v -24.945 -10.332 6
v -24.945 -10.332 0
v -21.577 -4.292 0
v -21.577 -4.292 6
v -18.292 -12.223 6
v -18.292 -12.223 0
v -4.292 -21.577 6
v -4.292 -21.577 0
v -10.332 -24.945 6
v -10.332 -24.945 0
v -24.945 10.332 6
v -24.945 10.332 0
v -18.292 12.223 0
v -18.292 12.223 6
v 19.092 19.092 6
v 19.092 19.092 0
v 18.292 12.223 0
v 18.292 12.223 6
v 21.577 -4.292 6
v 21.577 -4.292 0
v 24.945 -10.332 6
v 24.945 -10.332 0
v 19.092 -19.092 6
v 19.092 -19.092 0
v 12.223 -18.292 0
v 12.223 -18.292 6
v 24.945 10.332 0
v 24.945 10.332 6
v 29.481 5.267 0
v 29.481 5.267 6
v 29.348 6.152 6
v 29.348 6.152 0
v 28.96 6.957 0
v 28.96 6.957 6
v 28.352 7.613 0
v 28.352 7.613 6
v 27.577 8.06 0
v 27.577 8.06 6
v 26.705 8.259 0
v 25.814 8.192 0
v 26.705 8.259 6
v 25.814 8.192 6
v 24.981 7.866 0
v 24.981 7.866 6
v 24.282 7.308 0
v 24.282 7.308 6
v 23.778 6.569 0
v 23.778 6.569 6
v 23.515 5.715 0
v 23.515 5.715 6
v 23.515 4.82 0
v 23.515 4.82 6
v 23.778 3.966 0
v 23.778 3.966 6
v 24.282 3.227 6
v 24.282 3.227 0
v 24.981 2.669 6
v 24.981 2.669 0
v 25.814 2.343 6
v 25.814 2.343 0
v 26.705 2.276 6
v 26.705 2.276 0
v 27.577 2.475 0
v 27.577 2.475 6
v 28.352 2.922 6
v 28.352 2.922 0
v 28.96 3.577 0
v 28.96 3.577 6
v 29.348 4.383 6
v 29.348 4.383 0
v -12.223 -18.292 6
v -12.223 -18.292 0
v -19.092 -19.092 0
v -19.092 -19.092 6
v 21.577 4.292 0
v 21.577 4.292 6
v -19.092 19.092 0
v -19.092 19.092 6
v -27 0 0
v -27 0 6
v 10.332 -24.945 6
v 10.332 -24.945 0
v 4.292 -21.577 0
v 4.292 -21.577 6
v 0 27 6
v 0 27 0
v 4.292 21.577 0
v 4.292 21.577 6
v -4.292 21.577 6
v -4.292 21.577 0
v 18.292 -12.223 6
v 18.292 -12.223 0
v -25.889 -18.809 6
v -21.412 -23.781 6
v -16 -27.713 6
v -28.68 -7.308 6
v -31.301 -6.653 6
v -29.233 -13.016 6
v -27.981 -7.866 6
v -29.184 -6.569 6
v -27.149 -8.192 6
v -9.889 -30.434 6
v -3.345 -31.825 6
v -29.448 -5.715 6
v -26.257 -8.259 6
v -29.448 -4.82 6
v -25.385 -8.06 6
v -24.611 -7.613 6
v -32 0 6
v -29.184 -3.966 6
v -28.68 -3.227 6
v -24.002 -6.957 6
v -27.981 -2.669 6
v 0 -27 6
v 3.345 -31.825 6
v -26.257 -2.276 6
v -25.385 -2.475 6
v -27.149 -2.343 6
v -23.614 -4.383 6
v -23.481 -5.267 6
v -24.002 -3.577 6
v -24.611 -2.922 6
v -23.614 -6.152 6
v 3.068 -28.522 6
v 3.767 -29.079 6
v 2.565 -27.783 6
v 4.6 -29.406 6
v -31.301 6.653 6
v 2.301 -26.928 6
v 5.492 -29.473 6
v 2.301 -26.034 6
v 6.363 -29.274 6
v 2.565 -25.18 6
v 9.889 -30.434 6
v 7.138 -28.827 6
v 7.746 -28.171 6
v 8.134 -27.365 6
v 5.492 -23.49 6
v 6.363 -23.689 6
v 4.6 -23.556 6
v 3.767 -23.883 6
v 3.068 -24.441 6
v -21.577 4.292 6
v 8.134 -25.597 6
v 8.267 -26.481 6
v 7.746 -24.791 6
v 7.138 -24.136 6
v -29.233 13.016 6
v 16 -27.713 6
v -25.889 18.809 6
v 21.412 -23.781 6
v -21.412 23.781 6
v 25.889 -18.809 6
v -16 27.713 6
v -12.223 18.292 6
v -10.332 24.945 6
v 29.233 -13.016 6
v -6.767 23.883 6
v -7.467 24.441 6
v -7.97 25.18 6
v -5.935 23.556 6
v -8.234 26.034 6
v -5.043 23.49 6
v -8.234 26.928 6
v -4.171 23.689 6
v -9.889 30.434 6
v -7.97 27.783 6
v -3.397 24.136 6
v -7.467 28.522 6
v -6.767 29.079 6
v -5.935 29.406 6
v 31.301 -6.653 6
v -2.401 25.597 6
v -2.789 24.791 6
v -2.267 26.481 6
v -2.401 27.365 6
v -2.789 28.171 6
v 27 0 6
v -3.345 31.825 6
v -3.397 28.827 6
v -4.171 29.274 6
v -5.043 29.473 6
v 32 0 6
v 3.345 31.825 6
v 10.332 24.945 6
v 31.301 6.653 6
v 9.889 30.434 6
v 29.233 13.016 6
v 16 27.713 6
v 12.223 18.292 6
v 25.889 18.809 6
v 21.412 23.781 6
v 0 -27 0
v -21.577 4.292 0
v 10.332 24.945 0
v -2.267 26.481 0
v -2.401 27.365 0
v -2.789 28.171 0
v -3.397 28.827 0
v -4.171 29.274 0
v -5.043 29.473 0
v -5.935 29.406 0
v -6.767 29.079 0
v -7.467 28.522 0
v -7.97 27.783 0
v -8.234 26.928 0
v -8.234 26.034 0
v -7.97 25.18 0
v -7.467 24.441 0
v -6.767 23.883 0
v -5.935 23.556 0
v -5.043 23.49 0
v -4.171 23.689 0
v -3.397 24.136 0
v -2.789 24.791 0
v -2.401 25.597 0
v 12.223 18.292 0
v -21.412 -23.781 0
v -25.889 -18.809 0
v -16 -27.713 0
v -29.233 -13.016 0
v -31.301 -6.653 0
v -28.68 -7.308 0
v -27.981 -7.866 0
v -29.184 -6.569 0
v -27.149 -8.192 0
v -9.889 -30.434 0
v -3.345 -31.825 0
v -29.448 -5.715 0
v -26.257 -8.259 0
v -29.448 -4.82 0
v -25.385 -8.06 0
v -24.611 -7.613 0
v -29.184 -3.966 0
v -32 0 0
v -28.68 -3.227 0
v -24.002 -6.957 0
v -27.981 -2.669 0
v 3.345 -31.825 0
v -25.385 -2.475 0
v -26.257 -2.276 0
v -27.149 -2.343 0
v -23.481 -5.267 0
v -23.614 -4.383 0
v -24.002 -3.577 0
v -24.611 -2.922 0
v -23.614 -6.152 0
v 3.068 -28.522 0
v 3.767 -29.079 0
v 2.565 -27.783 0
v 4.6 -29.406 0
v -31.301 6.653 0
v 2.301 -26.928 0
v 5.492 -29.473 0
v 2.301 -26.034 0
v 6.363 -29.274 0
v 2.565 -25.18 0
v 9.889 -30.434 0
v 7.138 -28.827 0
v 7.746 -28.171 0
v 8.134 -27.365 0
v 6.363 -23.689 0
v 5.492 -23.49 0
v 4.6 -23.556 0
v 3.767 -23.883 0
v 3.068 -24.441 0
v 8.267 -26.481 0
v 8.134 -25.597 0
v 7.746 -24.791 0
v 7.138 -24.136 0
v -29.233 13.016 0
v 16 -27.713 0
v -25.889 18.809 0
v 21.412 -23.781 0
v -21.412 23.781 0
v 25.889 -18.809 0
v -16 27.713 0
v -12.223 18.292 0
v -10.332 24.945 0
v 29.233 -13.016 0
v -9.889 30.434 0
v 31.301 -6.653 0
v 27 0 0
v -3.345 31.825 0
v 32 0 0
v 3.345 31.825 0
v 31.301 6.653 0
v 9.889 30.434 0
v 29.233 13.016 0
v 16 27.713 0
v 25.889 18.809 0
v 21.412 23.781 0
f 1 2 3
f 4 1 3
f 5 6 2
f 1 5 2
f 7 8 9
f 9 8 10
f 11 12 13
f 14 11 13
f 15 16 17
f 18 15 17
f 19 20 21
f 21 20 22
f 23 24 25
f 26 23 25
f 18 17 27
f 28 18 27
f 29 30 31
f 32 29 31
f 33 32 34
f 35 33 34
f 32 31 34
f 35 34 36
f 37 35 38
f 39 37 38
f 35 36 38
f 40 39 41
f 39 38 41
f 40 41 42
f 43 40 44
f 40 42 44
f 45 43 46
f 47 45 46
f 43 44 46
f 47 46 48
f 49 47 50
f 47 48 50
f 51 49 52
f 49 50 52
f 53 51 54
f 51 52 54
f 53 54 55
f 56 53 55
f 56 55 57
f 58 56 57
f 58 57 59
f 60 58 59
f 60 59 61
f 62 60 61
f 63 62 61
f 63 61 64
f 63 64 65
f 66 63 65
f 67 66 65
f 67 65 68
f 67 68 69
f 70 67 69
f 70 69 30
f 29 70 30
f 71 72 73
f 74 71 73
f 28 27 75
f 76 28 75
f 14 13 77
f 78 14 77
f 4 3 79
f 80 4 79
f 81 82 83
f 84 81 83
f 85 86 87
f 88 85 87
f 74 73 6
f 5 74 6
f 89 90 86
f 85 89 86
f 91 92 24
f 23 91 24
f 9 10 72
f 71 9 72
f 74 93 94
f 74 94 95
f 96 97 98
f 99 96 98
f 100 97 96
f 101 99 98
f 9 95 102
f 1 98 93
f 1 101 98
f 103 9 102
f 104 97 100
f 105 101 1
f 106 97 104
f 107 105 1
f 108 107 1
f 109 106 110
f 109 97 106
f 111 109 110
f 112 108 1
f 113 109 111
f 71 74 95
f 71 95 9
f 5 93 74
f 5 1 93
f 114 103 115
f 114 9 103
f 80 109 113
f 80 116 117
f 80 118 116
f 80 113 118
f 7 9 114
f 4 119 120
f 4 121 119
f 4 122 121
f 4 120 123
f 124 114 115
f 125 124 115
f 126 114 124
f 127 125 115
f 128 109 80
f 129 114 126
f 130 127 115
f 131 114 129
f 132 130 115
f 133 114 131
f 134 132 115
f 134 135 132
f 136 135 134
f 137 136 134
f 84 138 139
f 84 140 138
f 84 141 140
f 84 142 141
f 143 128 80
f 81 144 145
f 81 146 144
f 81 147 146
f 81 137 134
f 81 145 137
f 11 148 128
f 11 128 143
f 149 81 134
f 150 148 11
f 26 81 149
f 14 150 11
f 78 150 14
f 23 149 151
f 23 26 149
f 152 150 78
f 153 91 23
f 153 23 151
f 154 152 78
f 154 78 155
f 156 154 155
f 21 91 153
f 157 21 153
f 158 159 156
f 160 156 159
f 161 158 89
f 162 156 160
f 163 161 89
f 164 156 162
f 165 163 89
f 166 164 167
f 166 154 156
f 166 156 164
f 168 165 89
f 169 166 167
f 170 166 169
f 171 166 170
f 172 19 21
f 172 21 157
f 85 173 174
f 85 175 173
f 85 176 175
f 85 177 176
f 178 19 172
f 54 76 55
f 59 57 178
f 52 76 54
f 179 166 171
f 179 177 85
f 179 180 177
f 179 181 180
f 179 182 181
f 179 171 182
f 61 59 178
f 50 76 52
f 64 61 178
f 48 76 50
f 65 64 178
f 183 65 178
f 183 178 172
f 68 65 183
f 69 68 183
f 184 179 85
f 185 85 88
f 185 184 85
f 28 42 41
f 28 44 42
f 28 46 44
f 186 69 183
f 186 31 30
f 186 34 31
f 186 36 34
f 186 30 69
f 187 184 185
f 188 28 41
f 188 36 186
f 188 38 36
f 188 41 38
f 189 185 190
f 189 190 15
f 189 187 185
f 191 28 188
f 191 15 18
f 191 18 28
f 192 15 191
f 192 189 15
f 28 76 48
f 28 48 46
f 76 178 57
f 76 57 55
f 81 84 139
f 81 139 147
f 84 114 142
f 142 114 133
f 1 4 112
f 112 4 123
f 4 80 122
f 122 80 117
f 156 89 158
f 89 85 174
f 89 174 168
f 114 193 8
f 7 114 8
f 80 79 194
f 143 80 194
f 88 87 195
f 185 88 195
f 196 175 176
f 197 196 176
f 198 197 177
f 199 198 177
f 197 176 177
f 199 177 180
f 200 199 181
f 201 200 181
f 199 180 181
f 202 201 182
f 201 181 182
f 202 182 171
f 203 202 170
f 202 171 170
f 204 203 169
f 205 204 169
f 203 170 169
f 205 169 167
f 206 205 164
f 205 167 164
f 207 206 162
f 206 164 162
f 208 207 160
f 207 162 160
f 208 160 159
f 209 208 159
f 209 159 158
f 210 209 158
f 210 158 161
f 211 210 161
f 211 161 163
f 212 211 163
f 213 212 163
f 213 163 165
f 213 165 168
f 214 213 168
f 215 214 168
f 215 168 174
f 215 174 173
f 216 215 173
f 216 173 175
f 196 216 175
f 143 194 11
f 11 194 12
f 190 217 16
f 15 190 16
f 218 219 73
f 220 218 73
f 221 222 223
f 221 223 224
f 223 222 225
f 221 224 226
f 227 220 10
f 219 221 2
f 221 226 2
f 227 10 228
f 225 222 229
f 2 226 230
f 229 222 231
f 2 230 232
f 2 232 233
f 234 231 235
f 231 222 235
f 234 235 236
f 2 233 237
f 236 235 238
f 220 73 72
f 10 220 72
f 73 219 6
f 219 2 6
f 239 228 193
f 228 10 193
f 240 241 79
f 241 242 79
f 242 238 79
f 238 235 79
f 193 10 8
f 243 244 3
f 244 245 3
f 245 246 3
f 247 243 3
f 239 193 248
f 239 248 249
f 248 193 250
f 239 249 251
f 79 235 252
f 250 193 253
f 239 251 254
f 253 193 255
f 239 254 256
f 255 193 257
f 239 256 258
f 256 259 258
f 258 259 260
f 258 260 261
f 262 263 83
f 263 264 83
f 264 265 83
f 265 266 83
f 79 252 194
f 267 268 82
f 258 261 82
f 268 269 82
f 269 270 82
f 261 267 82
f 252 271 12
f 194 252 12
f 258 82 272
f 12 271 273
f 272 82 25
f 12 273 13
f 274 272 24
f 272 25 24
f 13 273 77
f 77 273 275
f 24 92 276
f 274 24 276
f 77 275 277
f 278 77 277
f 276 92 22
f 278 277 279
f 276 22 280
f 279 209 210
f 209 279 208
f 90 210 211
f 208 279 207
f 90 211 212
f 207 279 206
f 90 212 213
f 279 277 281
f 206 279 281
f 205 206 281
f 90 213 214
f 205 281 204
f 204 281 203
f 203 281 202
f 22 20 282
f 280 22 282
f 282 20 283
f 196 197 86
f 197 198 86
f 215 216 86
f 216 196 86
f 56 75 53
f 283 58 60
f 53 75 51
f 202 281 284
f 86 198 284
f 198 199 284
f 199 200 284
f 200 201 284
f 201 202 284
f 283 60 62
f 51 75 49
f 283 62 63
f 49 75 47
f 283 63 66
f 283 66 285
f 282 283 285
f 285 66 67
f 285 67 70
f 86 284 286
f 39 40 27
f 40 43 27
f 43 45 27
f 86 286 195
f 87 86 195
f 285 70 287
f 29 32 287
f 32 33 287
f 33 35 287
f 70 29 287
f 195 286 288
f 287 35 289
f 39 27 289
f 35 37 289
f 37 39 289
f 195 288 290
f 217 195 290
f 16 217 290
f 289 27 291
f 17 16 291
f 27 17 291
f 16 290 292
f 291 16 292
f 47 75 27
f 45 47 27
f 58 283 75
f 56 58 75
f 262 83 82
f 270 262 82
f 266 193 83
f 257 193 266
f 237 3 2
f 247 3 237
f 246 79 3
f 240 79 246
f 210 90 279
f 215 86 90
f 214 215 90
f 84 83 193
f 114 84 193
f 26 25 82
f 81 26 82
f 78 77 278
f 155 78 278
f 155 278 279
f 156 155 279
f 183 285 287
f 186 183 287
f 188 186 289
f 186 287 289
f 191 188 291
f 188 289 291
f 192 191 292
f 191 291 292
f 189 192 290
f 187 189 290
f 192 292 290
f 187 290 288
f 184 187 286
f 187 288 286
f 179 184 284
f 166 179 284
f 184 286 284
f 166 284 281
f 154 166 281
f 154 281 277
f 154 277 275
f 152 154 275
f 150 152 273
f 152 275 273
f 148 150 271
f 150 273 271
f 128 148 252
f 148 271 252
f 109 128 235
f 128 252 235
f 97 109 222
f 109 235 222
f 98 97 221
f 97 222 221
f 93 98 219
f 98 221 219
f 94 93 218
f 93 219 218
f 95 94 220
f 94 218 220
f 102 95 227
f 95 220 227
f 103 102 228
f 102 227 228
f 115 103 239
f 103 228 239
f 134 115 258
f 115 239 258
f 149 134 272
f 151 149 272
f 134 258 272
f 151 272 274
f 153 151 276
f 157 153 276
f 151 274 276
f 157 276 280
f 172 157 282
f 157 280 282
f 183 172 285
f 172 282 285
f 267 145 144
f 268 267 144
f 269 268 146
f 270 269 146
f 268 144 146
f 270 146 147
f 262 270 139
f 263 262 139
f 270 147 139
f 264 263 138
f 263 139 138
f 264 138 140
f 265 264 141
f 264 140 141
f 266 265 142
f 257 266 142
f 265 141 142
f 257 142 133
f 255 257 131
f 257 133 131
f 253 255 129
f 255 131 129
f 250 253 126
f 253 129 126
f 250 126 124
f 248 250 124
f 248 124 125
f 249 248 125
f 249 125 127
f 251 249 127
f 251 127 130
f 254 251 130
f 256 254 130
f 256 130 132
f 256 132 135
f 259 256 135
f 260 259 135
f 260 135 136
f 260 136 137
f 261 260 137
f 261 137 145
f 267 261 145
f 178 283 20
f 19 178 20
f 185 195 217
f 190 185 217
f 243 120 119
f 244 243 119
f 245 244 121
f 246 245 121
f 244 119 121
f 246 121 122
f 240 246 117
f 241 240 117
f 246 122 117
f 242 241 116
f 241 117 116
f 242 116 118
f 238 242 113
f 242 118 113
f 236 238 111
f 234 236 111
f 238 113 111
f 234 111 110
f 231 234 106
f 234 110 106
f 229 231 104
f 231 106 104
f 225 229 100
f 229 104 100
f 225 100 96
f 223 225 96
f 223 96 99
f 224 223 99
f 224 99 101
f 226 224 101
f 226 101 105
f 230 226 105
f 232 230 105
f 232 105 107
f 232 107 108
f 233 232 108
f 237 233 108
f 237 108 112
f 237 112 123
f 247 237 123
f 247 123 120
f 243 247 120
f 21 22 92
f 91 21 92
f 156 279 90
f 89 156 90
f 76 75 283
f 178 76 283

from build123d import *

# Parameters (mm, degrees)
ESBO_O1_R                = 32
ESBO_O1_R_2              = 27
RESSALTO_EXTRUS_O2_DEPTH = 6
ESBO_O3_R                = 3
CORTE_EXTRUS_O1_DEPTH    = 46.650848842
ESBO_O4_R                = 3
ESBO_O4_R_2              = 3.281084103
RESSALTO_EXTRUS_O3_DEPTH = 6


with BuildPart() as part:
    # Esboço1 → Ressalto-extrusão2 (new body)
    # profile 1 of 17: a face of its own
    with BuildSketch(Plane.XY):
        Circle(ESBO_O1_R)
        Circle(ESBO_O1_R_2, mode=Mode.SUBTRACT)
    # profile 2 of 17: a face of its own
    with BuildSketch(Plane.XY):
        with BuildLine():
            Line((-4.291987084, 21.577276169), (0, 27))
            ThreePointArc((0, 27), (-5.267438694, 26.481202571), (-10.332452674, 24.944747378))
            Line((-10.332452674, 24.944747378), (-4.291987084, 21.577276169))
        make_face()
    # profile 3 of 17: a face of its own
    with BuildSketch(Plane.XY):
        with BuildLine():
            Line((-12.222545126, 18.292331471), (-10.332452674, 24.944747378))
            ThreePointArc((-10.332452674, 24.944747378), (-15.000396292, 22.449679532), (-19.091883092, 19.091883092))
            Line((-19.091883092, 19.091883092), (-12.222545126, 18.292331471))
        make_face()
    # profile 4 of 17: a face of its own
    with BuildSketch(Plane.XY):
        with BuildLine():
            Line((-18.292331471, 12.222545126), (-19.091883092, 19.091883092))
            ThreePointArc((-19.091883092, 19.091883092), (-22.449679532, 15.000396292), (-24.944747378, 10.332452674))
            Line((-24.944747378, 10.332452674), (-18.292331471, 12.222545126))
        make_face()
    # profile 5 of 17: a face of its own
    with BuildSketch(Plane.XY):
        with BuildLine():
            Line((-21.577276169, 4.291987084), (-24.944747378, 10.332452674))
            ThreePointArc((-24.944747378, 10.332452674), (-26.481202571, 5.267438694), (-27, 0))
            Line((-27, 0), (-21.577276169, 4.291987084))
        make_face()
    # profile 6 of 17: a face of its own
    with BuildSketch(Plane.XY):
        with BuildLine():
            Line((-21.577276169, -4.291987084), (-27, 0))
            ThreePointArc((-27, 0), (-26.481202571, -5.267438694), (-24.944747378, -10.332452674))
            Line((-24.944747378, -10.332452674), (-21.577276169, -4.291987084))
        make_face()
    # profile 7 of 17: a face of its own
    with BuildSketch(Plane.XY):
        with BuildLine():
            Line((-18.292331471, -12.222545126), (-24.944747378, -10.332452674))
            ThreePointArc((-24.944747378, -10.332452674), (-22.449679532, -15.000396292), (-19.091883092, -19.091883092))
            Line((-19.091883092, -19.091883092), (-18.292331471, -12.222545126))
        make_face()
    # profile 8 of 17: a face of its own
    with BuildSketch(Plane.XY):
        with BuildLine():
            Line((-12.222545126, -18.292331471), (-19.091883092, -19.091883092))
            ThreePointArc((-19.091883092, -19.091883092), (-15.000396292, -22.449679532), (-10.332452674, -24.944747378))
            Line((-10.332452674, -24.944747378), (-12.222545126, -18.292331471))
        make_face()
    # profile 9 of 17: a face of its own
    with BuildSketch(Plane.XY):
        with BuildLine():
            Line((-4.291987084, -21.577276169), (-10.332452674, -24.944747378))
            ThreePointArc((-10.332452674, -24.944747378), (-5.267438694, -26.481202571), (0, -27))
            Line((0, -27), (-4.291987084, -21.577276169))
        make_face()
    # profile 10 of 17: a face of its own
    with BuildSketch(Plane.XY):
        with BuildLine():
            ThreePointArc((0, -27), (5.267438694, -26.481202571), (10.332452674, -24.944747378))
            Line((10.332452674, -24.944747378), (4.291987084, -21.577276169))
            Line((4.291987084, -21.577276169), (0, -27))
        make_face()
    # profile 11 of 17: a face of its own
    with BuildSketch(Plane.XY):
        with BuildLine():
            ThreePointArc((10.332452674, -24.944747378), (15.000396292, -22.449679532), (19.091883092, -19.091883092))
            Line((19.091883092, -19.091883092), (12.222545126, -18.292331471))
            Line((12.222545126, -18.292331471), (10.332452674, -24.944747378))
        make_face()
    # profile 12 of 17: a face of its own
    with BuildSketch(Plane.XY):
        with BuildLine():
            ThreePointArc((19.091883092, -19.091883092), (22.449679532, -15.000396292), (24.944747378, -10.332452674))
            Line((24.944747378, -10.332452674), (18.292331471, -12.222545126))
            Line((18.292331471, -12.222545126), (19.091883092, -19.091883092))
        make_face()
    # profile 13 of 17: a face of its own
    with BuildSketch(Plane.XY):
        with BuildLine():
            ThreePointArc((24.944747378, -10.332452674), (26.481202571, -5.267438694), (27, 0))
            Line((27, 0), (21.577276169, -4.291987084))
            Line((21.577276169, -4.291987084), (24.944747378, -10.332452674))
        make_face()
    # profile 14 of 17: a face of its own
    with BuildSketch(Plane.XY):
        with BuildLine():
            ThreePointArc((27, 0), (26.481202571, 5.267438694), (24.944747378, 10.332452674))
            Line((24.944747378, 10.332452674), (21.577276169, 4.291987084))
            Line((21.577276169, 4.291987084), (27, 0))
        make_face()
    # profile 15 of 17: a face of its own
    with BuildSketch(Plane.XY):
        with BuildLine():
            ThreePointArc((24.944747378, 10.332452674), (22.449679532, 15.000396292), (19.091883092, 19.091883092))
            Line((19.091883092, 19.091883092), (18.292331471, 12.222545126))
            Line((18.292331471, 12.222545126), (24.944747378, 10.332452674))
        make_face()
    # profile 16 of 17: a face of its own
    with BuildSketch(Plane.XY):
        with BuildLine():
            ThreePointArc((19.091883092, 19.091883092), (15.000396292, 22.449679532), (10.332452674, 24.944747378))
            Line((10.332452674, 24.944747378), (12.222545126, 18.292331471))
            Line((12.222545126, 18.292331471), (19.091883092, 19.091883092))
        make_face()
    # profile 17 of 17: a face of its own
    with BuildSketch(Plane.XY):
        with BuildLine():
            ThreePointArc((10.332452674, 24.944747378), (5.267438694, 26.481202571), (0, 27))
            Line((0, 27), (4.291987084, 21.577276169))
            Line((4.291987084, 21.577276169), (10.332452674, 24.944747378))
        make_face()
    extrude(amount=RESSALTO_EXTRUS_O2_DEPTH)

    # Esboço3 → Corte-extrusão1 (cut, through all)
    with BuildSketch(Plane.XY.offset(6)):
        with Locations((-5.267438694, 26.481202571)):
            Circle(ESBO_O3_R)
        with Locations((5.267438694, -26.481202571)):
            Circle(ESBO_O3_R)
        with Locations((26.481202571, 5.267438694)):
            Circle(ESBO_O3_R)
        with Locations((-26.481202571, -5.267438694)):
            Circle(ESBO_O3_R)
        with Locations((22.449679532, -15.000396292)):
            Circle(ESBO_O3_R)
        with Locations((-22.449679532, 15.000396292)):
            Circle(ESBO_O3_R)
    extrude(amount=-CORTE_EXTRUS_O1_DEPTH, mode=Mode.SUBTRACT)

    # Esboço4 → Ressalto-extrusão3 (add)
    with BuildSketch(Plane.XY.offset(6)):
        with Locations((-22.449679532, 15.000396292)):
            Circle(ESBO_O4_R)
        with Locations((22.424396541, -15.280341006)):
            Circle(ESBO_O4_R_2)
    extrude(amount=-RESSALTO_EXTRUS_O3_DEPTH)


solid = part.part
